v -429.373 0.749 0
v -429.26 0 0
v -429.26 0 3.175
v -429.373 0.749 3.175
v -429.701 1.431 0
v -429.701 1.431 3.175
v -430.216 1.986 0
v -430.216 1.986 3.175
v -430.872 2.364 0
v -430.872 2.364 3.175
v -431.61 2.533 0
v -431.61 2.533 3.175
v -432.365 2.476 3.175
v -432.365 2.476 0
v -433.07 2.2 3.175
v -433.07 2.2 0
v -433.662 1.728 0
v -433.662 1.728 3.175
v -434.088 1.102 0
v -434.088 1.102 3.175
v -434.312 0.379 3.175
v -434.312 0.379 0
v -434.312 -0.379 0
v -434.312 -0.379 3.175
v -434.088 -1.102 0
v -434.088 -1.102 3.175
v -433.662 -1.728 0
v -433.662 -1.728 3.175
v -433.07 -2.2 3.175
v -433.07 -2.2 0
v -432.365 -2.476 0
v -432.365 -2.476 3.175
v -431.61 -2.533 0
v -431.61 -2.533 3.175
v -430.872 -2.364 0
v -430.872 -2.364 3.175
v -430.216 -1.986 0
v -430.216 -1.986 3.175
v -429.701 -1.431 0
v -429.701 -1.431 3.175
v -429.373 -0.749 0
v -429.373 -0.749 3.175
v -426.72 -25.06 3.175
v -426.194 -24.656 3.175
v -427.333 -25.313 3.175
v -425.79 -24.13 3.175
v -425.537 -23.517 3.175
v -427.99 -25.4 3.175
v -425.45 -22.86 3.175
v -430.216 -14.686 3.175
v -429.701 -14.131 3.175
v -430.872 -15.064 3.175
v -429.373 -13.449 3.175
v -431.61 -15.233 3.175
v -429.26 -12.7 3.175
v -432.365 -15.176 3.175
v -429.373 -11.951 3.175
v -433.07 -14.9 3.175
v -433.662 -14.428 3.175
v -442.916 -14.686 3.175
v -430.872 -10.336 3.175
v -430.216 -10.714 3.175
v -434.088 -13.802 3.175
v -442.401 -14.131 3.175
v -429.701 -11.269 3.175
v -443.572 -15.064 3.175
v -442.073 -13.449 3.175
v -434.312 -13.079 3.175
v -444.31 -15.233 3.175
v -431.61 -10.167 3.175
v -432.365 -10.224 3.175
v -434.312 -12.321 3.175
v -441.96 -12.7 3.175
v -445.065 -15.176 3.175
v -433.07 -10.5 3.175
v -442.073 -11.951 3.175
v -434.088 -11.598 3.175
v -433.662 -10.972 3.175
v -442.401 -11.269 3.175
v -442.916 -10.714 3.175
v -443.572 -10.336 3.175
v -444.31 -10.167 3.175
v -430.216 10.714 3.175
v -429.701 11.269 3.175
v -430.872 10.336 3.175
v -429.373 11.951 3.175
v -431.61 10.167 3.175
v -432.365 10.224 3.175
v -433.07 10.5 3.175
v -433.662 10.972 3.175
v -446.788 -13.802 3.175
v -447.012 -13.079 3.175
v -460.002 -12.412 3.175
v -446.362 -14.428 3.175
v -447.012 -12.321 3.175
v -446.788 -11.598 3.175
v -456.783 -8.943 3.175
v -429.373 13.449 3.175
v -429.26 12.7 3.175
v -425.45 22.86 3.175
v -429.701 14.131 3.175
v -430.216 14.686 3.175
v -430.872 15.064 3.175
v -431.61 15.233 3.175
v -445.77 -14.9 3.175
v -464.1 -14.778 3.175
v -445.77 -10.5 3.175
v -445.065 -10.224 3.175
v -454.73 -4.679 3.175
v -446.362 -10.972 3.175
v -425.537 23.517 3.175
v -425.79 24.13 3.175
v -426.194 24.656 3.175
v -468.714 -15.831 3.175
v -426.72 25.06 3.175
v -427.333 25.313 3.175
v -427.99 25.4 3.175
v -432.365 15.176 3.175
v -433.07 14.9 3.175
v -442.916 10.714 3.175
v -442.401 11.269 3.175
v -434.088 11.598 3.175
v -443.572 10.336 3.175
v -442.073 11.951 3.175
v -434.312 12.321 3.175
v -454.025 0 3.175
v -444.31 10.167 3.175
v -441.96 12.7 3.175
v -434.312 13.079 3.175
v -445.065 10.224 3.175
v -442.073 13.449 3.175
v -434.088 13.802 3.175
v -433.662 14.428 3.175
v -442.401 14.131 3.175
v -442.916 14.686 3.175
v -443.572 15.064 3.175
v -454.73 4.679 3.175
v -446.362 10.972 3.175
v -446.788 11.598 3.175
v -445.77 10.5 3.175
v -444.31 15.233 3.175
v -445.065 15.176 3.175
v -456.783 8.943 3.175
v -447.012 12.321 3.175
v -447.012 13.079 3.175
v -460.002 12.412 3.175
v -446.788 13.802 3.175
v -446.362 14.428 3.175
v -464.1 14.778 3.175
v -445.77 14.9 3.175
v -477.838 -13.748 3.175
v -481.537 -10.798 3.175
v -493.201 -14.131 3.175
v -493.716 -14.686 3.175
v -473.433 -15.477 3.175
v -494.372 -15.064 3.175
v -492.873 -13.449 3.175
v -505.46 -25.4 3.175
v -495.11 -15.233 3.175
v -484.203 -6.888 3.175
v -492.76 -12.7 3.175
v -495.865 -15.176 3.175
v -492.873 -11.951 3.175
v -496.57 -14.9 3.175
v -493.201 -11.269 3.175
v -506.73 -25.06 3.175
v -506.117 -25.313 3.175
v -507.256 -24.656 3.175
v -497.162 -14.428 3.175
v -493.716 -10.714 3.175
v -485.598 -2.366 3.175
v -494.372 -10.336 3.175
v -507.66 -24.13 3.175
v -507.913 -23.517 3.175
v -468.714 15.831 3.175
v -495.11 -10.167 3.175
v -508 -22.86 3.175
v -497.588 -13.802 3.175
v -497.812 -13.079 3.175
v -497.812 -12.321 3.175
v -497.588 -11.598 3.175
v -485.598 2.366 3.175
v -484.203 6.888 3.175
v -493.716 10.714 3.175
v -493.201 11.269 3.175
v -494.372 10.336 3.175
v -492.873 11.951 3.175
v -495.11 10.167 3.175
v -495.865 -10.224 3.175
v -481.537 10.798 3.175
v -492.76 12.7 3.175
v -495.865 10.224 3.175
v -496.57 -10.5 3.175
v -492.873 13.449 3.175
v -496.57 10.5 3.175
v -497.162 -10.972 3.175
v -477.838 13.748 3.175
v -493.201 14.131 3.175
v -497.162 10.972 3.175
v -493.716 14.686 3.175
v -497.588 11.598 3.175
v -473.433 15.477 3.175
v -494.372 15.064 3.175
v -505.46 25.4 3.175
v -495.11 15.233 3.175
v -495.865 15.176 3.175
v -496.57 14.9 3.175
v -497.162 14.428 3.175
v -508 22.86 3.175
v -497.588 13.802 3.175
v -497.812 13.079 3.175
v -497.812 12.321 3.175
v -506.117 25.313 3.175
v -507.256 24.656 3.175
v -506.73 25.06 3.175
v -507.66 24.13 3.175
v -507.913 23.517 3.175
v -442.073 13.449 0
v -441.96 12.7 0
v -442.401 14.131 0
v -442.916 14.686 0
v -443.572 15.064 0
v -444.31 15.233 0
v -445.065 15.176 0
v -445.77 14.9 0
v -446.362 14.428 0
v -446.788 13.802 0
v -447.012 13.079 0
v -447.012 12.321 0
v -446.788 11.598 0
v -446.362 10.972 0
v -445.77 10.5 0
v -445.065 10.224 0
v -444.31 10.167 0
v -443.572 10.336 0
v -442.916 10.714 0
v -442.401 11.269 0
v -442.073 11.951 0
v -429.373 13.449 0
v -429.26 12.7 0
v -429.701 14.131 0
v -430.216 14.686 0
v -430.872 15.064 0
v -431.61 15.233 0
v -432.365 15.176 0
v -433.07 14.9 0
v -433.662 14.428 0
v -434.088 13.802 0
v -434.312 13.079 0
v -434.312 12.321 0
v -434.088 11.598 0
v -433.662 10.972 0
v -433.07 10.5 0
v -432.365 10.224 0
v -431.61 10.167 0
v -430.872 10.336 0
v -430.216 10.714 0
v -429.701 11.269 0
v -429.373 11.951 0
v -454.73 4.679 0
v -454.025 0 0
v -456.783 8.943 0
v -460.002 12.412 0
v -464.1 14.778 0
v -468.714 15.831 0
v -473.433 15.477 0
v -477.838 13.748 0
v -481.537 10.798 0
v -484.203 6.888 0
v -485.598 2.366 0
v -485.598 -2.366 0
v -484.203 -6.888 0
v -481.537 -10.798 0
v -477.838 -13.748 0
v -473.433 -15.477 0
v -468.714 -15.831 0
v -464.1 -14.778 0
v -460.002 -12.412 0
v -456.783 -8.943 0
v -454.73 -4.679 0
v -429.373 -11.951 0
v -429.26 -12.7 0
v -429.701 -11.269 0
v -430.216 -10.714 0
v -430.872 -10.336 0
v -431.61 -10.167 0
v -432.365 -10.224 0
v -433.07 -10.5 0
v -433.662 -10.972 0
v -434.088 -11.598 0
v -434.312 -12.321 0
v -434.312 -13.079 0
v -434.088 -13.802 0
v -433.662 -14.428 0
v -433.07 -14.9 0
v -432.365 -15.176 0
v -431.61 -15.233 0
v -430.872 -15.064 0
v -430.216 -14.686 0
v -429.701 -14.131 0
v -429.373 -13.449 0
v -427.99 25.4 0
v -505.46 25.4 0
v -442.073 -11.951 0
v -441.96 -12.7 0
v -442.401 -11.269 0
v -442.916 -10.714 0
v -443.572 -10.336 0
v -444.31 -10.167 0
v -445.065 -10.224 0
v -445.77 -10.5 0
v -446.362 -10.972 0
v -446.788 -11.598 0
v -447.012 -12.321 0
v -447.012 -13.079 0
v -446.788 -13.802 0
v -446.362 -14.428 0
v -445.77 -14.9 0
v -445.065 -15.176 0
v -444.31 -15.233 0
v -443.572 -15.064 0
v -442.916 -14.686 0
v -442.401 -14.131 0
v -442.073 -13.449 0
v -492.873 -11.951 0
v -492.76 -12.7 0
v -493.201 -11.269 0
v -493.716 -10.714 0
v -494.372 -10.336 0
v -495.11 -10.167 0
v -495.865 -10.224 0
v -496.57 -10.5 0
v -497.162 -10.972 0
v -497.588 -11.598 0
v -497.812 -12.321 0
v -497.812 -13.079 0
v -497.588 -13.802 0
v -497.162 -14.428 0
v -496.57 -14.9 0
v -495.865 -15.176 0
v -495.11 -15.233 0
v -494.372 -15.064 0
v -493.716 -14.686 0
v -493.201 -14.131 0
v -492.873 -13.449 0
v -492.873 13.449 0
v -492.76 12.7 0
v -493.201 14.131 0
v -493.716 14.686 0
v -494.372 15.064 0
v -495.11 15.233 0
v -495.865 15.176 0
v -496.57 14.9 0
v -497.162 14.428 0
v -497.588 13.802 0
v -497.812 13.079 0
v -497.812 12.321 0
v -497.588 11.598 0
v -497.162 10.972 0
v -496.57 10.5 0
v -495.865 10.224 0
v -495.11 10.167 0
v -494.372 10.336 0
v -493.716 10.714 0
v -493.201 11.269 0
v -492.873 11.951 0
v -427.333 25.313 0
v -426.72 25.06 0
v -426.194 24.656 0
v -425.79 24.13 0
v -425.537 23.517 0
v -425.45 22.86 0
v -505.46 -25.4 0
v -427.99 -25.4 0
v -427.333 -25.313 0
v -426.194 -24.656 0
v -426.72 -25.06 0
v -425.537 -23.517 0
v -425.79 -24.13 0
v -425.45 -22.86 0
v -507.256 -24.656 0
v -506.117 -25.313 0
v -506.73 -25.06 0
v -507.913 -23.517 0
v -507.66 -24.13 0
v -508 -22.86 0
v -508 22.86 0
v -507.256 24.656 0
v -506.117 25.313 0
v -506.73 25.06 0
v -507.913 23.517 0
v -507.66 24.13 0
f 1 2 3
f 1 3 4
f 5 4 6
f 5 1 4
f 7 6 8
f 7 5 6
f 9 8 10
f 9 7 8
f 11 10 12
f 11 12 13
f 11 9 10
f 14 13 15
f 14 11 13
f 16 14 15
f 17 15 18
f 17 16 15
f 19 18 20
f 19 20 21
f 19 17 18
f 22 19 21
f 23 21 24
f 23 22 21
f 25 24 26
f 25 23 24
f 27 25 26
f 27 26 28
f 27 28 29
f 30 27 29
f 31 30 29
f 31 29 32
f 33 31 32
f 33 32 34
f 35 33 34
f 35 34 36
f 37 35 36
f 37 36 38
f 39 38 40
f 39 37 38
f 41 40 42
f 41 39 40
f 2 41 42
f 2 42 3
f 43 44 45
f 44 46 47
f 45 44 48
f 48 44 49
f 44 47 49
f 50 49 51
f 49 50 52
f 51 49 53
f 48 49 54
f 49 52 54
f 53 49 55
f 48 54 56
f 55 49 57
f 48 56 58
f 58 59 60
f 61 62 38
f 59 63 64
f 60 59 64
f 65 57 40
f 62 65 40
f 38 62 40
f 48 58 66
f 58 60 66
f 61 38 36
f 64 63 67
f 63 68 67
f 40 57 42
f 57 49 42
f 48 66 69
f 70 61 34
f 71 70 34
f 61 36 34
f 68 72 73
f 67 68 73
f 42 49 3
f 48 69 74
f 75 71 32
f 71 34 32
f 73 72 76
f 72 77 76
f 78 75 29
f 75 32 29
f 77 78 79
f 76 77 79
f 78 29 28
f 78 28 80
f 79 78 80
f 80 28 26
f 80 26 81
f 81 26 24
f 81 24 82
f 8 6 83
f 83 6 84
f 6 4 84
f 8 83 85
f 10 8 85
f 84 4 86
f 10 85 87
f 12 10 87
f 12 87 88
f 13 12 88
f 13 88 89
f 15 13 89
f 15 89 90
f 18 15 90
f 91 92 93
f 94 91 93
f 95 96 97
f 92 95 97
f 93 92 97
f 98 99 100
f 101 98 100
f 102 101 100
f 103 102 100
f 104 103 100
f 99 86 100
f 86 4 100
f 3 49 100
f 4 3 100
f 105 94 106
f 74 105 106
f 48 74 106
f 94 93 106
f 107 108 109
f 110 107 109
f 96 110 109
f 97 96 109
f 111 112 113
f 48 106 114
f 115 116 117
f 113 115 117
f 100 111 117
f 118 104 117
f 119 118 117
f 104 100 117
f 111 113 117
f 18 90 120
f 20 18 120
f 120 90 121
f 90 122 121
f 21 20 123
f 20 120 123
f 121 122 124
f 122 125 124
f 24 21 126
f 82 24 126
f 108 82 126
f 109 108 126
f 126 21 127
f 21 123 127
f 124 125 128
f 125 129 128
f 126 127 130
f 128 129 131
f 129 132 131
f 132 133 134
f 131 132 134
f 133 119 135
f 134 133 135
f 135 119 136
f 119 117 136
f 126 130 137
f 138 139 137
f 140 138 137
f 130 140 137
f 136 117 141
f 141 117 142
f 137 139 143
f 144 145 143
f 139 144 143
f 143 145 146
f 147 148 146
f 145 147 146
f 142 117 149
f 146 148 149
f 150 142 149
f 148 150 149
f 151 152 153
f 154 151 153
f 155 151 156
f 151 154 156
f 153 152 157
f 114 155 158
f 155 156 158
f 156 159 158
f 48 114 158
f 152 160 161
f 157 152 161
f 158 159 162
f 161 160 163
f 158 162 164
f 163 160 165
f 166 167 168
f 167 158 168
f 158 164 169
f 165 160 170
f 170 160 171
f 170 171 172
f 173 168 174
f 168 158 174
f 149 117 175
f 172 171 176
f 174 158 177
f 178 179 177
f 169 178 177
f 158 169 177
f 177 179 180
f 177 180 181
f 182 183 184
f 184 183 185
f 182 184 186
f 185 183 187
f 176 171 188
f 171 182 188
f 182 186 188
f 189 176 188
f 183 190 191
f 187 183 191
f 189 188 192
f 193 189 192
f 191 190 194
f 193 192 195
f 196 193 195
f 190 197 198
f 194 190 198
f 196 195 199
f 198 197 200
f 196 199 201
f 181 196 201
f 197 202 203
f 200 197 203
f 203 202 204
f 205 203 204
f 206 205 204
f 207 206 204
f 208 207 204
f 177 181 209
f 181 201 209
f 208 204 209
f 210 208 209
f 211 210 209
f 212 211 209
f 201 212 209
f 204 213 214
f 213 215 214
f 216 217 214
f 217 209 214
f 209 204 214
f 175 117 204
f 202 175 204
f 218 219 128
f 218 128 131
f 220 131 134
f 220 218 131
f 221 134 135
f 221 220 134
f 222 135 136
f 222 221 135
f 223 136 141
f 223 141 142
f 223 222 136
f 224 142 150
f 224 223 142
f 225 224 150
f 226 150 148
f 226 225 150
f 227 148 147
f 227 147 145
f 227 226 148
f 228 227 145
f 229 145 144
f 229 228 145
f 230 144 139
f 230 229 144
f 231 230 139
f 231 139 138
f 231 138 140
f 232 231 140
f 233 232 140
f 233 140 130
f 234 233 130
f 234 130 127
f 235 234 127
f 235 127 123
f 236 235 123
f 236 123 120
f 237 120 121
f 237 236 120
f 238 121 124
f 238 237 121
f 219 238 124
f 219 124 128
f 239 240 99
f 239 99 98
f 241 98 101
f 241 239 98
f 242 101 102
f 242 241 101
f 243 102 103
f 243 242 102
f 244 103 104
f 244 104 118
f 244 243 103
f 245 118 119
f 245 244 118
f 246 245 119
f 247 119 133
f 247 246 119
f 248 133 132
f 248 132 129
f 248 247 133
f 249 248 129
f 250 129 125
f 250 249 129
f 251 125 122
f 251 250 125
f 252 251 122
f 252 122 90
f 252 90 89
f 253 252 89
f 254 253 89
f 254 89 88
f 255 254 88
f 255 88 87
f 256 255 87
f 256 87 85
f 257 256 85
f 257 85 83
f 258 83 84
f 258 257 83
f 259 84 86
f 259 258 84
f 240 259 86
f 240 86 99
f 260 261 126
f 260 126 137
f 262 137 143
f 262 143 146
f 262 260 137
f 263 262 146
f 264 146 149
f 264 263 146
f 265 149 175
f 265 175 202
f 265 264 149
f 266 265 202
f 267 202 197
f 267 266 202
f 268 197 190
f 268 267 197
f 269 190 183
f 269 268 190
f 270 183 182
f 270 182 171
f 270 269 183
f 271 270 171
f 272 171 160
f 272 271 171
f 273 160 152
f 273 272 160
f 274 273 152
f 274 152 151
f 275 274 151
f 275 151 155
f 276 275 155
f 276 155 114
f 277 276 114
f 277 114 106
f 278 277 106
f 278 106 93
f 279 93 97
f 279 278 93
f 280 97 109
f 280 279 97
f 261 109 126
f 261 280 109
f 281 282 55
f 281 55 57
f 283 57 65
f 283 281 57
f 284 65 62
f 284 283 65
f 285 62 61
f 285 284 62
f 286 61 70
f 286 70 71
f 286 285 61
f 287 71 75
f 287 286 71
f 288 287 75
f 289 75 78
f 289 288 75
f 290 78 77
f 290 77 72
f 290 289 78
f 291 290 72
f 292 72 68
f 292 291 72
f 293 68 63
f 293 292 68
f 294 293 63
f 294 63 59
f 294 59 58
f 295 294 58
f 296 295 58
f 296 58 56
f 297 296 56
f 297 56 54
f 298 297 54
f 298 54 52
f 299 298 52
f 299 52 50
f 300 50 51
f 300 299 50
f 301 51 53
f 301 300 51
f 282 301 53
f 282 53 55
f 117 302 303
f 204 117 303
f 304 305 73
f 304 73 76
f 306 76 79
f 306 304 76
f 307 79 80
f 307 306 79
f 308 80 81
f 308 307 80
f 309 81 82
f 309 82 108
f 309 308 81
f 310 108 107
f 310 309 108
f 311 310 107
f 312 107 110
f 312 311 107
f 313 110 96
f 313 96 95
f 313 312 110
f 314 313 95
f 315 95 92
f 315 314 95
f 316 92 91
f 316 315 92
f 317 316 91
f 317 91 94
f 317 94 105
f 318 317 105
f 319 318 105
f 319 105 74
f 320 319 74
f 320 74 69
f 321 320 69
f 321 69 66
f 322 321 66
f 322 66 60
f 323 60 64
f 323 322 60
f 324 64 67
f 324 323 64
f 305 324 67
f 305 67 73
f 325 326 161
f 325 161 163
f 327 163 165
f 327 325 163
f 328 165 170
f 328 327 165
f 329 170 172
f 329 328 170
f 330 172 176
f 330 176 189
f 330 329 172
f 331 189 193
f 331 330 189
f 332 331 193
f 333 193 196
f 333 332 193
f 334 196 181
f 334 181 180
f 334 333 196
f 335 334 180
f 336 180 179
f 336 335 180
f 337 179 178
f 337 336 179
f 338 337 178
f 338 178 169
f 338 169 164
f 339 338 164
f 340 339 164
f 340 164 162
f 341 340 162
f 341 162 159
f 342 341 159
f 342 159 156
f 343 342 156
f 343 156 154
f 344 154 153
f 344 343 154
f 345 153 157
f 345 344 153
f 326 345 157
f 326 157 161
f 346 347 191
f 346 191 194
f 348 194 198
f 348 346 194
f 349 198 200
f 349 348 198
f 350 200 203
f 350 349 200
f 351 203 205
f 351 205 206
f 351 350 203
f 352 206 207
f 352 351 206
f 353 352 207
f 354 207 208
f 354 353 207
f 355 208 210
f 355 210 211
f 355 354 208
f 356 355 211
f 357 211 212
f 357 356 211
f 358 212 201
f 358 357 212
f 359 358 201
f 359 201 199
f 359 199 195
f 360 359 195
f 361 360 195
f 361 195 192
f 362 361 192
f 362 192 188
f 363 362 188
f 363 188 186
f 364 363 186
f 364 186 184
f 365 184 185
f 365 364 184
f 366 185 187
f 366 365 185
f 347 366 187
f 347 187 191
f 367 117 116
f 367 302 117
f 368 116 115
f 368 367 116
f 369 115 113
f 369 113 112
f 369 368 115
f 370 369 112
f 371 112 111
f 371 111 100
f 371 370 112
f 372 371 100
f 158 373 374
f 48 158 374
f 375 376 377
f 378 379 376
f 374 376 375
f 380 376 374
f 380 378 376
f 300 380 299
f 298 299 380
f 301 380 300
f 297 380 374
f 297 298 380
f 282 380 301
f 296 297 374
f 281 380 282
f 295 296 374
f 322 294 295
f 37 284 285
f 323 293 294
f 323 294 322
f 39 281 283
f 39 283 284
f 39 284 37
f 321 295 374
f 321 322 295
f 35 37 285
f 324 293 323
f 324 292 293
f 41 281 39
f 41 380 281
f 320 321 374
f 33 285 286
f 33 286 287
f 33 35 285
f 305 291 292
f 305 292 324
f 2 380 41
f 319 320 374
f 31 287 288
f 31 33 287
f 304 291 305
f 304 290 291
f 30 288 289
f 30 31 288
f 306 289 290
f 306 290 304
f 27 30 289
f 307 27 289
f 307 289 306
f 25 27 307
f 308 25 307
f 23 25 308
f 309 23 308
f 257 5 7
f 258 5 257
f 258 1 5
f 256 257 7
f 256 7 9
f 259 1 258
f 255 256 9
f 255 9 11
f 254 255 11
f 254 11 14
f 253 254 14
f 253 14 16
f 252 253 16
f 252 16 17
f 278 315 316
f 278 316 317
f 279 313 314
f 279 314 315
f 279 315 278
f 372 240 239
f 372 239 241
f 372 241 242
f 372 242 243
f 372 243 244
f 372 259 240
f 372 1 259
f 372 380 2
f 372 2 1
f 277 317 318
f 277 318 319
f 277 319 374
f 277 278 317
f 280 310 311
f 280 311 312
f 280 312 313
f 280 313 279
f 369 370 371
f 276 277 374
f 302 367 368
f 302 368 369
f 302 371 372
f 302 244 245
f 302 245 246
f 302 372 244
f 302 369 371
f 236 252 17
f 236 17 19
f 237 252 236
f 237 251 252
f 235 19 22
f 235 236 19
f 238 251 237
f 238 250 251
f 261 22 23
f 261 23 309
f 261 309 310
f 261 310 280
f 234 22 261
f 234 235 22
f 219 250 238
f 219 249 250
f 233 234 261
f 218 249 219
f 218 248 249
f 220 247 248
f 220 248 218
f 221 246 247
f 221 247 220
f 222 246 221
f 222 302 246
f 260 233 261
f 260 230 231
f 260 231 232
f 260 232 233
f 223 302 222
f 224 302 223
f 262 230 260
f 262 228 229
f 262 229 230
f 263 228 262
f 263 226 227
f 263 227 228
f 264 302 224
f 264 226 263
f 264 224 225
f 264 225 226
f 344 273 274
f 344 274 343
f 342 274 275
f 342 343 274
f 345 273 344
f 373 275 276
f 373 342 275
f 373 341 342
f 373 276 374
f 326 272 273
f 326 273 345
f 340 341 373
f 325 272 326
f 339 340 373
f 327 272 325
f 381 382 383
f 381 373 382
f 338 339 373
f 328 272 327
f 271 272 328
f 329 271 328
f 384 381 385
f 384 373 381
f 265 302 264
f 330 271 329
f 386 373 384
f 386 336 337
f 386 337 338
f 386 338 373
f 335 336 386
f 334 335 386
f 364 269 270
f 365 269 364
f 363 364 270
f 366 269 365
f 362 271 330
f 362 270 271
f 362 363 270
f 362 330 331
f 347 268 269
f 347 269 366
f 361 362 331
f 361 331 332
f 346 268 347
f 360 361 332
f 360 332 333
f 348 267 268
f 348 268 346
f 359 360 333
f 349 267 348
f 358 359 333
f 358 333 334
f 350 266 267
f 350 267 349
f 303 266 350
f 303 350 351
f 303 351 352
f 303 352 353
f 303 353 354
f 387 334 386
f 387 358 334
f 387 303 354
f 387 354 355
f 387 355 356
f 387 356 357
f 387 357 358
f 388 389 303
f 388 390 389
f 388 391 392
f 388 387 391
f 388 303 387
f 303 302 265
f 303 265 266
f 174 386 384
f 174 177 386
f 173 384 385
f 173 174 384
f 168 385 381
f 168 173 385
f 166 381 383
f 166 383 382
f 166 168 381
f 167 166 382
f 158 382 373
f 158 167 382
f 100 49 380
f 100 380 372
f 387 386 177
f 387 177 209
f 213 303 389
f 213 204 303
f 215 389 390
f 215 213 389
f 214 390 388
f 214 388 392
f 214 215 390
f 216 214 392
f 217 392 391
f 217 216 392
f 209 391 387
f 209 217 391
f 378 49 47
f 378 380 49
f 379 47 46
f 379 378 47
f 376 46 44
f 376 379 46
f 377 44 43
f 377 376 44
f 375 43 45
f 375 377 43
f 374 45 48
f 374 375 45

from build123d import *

# Parameters (mm, degrees)
SKETCH2_R           = 15.875
SKETCH2_R_2         = 2.54
BOSS_EXTRUDE1_DEPTH = 3.175
FILLET1_R           = 2.54
SKETCH4_OUTSIDE_W   = 171.436
SKETCH4_OUTSIDE_H   = 82.536
SKETCH4_OUTSIDE_W_2 = 82.55
SKETCH4_OUTSIDE_H_2 = 50.8
CUT_EXTRUDE1_DEPTH  = 509.64451302
FILLET2_R           = 2.54


with BuildPart() as part:
    # Sketch2 → Boss-Extrude1 (new body)
    with BuildSketch(Plane.XY):
        Polygon((-508, 25.4), (-481.624580264, 25.4), (-457.99375, 25.4), (-431.8, 25.4), (-368.3, 25.4), (-368.3, -25.4), (-431.8, -25.4), (-457.99375, -25.4), (-481.624580264, -25.4), (-508, -25.4), align=None)
        with Locations((-469.9, 0)):
            Circle(SKETCH2_R, mode=Mode.SUBTRACT)
        with Locations((-495.3, 12.7)):
            Circle(SKETCH2_R_2, mode=Mode.SUBTRACT)
        with Locations((-495.3, -12.7)):
            Circle(SKETCH2_R_2, mode=Mode.SUBTRACT)
        with Locations((-444.5, -12.7)):
            Circle(SKETCH2_R_2, mode=Mode.SUBTRACT)
        with Locations((-431.8, -12.7)):
            Circle(SKETCH2_R_2, mode=Mode.SUBTRACT)
        with Locations((-419.1, -12.7)):
            Circle(SKETCH2_R_2, mode=Mode.SUBTRACT)
        with Locations((-419.1, 0)):
            Circle(SKETCH2_R_2, mode=Mode.SUBTRACT)
        with Locations((-431.8, 0)):
            Circle(SKETCH2_R_2, mode=Mode.SUBTRACT)
        with Locations((-431.8, 12.7)):
            Circle(SKETCH2_R_2, mode=Mode.SUBTRACT)
        with Locations((-419.1, 12.7)):
            Circle(SKETCH2_R_2, mode=Mode.SUBTRACT)
        with Locations((-444.5, 12.7)):
            Circle(SKETCH2_R_2, mode=Mode.SUBTRACT)
        with Locations((-406.4, 12.7)):
            Circle(SKETCH2_R_2, mode=Mode.SUBTRACT)
        with Locations((-406.4, 0)):
            Circle(SKETCH2_R_2, mode=Mode.SUBTRACT)
        with Locations((-406.4, -12.7)):
            Circle(SKETCH2_R_2, mode=Mode.SUBTRACT)
        with Locations((-393.7, 12.7)):
            Circle(SKETCH2_R_2, mode=Mode.SUBTRACT)
        with Locations((-393.7, 0)):
            Circle(SKETCH2_R_2, mode=Mode.SUBTRACT)
        with Locations((-393.7, -12.7)):
            Circle(SKETCH2_R_2, mode=Mode.SUBTRACT)
        with Locations((-381, 12.7)):
            Circle(SKETCH2_R_2, mode=Mode.SUBTRACT)
        with Locations((-381, 0)):
            Circle(SKETCH2_R_2, mode=Mode.SUBTRACT)
        with Locations((-381, -12.7)):
            Circle(SKETCH2_R_2, mode=Mode.SUBTRACT)
    extrude(amount=BOSS_EXTRUDE1_DEPTH)

    # Fillet1
    fillet1_edges = [part.edges().sort_by_distance(p)[0] for p in [
        (-508, 25.4, 1.5875),
        (-368.3, 25.4, 1.5875),
        (-368.3, -25.4, 1.5875),
        (-508, -25.4, 1.5875),
    ]]
    fillet(fillet1_edges, radius=FILLET1_R)

    # Sketch4 outside → Cut-Extrude1 (cut, through all)
    with BuildSketch(Plane.XY.offset(3.175)):
        with Locations((-438.15, 0)):
            Rectangle(SKETCH4_OUTSIDE_W, SKETCH4_OUTSIDE_H)
        with Locations((-466.725, 0)):
            Rectangle(SKETCH4_OUTSIDE_W_2, SKETCH4_OUTSIDE_H_2, mode=Mode.SUBTRACT)
    extrude(amount=-CUT_EXTRUDE1_DEPTH, mode=Mode.SUBTRACT)

    # Fillet2
    fillet2_edges = [part.edges().sort_by_distance(p)[0] for p in [
        (-425.45, 25.4, 1.5875),
        (-425.45, -25.4, 1.5875),
    ]]
    fillet(fillet2_edges, radius=FILLET2_R)


solid = part.part
